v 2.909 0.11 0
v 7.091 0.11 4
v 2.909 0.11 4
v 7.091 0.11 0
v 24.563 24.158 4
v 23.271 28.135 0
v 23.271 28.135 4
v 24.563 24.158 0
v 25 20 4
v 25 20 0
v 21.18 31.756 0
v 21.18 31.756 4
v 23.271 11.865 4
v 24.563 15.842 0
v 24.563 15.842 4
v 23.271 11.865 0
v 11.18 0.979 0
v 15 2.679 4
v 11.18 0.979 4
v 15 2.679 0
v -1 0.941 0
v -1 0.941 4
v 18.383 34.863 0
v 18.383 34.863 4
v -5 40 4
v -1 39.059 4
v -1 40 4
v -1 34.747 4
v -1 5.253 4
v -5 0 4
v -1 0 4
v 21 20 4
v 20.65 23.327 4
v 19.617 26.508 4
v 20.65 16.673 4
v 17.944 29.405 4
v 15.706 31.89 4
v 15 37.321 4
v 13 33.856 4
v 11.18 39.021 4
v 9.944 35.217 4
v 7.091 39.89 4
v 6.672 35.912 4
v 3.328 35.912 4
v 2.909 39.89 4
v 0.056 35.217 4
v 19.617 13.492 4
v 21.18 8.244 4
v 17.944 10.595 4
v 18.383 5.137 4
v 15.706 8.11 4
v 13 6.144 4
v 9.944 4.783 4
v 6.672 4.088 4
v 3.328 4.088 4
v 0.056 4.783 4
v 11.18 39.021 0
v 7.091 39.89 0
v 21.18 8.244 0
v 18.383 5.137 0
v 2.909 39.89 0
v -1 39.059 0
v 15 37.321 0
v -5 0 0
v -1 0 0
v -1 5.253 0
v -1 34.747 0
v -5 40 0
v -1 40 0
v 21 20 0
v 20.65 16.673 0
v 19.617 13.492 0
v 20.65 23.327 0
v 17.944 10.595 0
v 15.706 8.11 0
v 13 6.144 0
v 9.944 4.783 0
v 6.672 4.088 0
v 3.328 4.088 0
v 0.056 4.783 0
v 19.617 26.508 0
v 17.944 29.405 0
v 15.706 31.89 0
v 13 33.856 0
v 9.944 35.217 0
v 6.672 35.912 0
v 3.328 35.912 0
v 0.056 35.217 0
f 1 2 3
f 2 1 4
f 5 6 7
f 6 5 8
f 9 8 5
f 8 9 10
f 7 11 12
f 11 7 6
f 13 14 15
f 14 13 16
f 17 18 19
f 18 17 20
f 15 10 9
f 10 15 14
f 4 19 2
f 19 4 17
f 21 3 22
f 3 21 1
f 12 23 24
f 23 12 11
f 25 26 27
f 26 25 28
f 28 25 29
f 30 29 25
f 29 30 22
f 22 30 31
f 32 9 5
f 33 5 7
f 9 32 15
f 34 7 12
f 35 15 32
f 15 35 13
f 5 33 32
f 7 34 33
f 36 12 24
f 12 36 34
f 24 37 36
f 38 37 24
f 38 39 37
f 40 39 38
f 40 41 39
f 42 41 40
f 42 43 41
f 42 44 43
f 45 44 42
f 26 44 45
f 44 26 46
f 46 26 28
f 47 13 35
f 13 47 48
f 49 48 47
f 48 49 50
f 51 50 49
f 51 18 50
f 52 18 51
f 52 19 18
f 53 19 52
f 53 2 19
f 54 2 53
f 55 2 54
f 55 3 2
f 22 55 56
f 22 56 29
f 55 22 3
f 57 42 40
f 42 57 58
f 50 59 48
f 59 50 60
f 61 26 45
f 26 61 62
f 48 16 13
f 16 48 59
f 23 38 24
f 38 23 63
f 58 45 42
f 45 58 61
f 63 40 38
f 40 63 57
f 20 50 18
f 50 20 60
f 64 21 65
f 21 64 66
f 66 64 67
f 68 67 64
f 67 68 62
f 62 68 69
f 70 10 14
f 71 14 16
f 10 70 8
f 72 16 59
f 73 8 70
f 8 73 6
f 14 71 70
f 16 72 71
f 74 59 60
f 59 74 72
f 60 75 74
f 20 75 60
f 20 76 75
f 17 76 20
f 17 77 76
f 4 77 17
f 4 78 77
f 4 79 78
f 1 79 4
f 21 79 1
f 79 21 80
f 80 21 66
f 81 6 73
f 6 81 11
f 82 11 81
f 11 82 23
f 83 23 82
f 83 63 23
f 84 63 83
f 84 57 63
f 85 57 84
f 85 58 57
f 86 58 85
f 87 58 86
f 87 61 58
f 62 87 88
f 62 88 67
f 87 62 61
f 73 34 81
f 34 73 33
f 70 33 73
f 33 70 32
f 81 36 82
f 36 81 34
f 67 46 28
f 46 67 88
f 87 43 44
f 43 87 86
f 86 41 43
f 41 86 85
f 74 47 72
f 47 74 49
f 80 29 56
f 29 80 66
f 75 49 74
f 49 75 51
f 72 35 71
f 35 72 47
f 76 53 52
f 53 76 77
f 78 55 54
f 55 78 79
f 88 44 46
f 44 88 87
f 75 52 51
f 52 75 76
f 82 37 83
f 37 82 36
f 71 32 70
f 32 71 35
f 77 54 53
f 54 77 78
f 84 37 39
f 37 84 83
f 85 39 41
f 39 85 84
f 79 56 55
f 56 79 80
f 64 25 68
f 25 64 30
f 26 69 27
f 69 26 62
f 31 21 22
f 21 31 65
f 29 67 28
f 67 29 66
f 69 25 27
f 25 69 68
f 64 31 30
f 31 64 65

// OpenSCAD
//буква d
 translate([-5,0,0]) cube([4,40,4]);
difference(){
 translate([5,20,0]) cylinder(4,20,20);
 translate([5,20,-1]) cylinder(6,16,16);
 translate([-15,0,-1]) cube([10,40,6]);
}
